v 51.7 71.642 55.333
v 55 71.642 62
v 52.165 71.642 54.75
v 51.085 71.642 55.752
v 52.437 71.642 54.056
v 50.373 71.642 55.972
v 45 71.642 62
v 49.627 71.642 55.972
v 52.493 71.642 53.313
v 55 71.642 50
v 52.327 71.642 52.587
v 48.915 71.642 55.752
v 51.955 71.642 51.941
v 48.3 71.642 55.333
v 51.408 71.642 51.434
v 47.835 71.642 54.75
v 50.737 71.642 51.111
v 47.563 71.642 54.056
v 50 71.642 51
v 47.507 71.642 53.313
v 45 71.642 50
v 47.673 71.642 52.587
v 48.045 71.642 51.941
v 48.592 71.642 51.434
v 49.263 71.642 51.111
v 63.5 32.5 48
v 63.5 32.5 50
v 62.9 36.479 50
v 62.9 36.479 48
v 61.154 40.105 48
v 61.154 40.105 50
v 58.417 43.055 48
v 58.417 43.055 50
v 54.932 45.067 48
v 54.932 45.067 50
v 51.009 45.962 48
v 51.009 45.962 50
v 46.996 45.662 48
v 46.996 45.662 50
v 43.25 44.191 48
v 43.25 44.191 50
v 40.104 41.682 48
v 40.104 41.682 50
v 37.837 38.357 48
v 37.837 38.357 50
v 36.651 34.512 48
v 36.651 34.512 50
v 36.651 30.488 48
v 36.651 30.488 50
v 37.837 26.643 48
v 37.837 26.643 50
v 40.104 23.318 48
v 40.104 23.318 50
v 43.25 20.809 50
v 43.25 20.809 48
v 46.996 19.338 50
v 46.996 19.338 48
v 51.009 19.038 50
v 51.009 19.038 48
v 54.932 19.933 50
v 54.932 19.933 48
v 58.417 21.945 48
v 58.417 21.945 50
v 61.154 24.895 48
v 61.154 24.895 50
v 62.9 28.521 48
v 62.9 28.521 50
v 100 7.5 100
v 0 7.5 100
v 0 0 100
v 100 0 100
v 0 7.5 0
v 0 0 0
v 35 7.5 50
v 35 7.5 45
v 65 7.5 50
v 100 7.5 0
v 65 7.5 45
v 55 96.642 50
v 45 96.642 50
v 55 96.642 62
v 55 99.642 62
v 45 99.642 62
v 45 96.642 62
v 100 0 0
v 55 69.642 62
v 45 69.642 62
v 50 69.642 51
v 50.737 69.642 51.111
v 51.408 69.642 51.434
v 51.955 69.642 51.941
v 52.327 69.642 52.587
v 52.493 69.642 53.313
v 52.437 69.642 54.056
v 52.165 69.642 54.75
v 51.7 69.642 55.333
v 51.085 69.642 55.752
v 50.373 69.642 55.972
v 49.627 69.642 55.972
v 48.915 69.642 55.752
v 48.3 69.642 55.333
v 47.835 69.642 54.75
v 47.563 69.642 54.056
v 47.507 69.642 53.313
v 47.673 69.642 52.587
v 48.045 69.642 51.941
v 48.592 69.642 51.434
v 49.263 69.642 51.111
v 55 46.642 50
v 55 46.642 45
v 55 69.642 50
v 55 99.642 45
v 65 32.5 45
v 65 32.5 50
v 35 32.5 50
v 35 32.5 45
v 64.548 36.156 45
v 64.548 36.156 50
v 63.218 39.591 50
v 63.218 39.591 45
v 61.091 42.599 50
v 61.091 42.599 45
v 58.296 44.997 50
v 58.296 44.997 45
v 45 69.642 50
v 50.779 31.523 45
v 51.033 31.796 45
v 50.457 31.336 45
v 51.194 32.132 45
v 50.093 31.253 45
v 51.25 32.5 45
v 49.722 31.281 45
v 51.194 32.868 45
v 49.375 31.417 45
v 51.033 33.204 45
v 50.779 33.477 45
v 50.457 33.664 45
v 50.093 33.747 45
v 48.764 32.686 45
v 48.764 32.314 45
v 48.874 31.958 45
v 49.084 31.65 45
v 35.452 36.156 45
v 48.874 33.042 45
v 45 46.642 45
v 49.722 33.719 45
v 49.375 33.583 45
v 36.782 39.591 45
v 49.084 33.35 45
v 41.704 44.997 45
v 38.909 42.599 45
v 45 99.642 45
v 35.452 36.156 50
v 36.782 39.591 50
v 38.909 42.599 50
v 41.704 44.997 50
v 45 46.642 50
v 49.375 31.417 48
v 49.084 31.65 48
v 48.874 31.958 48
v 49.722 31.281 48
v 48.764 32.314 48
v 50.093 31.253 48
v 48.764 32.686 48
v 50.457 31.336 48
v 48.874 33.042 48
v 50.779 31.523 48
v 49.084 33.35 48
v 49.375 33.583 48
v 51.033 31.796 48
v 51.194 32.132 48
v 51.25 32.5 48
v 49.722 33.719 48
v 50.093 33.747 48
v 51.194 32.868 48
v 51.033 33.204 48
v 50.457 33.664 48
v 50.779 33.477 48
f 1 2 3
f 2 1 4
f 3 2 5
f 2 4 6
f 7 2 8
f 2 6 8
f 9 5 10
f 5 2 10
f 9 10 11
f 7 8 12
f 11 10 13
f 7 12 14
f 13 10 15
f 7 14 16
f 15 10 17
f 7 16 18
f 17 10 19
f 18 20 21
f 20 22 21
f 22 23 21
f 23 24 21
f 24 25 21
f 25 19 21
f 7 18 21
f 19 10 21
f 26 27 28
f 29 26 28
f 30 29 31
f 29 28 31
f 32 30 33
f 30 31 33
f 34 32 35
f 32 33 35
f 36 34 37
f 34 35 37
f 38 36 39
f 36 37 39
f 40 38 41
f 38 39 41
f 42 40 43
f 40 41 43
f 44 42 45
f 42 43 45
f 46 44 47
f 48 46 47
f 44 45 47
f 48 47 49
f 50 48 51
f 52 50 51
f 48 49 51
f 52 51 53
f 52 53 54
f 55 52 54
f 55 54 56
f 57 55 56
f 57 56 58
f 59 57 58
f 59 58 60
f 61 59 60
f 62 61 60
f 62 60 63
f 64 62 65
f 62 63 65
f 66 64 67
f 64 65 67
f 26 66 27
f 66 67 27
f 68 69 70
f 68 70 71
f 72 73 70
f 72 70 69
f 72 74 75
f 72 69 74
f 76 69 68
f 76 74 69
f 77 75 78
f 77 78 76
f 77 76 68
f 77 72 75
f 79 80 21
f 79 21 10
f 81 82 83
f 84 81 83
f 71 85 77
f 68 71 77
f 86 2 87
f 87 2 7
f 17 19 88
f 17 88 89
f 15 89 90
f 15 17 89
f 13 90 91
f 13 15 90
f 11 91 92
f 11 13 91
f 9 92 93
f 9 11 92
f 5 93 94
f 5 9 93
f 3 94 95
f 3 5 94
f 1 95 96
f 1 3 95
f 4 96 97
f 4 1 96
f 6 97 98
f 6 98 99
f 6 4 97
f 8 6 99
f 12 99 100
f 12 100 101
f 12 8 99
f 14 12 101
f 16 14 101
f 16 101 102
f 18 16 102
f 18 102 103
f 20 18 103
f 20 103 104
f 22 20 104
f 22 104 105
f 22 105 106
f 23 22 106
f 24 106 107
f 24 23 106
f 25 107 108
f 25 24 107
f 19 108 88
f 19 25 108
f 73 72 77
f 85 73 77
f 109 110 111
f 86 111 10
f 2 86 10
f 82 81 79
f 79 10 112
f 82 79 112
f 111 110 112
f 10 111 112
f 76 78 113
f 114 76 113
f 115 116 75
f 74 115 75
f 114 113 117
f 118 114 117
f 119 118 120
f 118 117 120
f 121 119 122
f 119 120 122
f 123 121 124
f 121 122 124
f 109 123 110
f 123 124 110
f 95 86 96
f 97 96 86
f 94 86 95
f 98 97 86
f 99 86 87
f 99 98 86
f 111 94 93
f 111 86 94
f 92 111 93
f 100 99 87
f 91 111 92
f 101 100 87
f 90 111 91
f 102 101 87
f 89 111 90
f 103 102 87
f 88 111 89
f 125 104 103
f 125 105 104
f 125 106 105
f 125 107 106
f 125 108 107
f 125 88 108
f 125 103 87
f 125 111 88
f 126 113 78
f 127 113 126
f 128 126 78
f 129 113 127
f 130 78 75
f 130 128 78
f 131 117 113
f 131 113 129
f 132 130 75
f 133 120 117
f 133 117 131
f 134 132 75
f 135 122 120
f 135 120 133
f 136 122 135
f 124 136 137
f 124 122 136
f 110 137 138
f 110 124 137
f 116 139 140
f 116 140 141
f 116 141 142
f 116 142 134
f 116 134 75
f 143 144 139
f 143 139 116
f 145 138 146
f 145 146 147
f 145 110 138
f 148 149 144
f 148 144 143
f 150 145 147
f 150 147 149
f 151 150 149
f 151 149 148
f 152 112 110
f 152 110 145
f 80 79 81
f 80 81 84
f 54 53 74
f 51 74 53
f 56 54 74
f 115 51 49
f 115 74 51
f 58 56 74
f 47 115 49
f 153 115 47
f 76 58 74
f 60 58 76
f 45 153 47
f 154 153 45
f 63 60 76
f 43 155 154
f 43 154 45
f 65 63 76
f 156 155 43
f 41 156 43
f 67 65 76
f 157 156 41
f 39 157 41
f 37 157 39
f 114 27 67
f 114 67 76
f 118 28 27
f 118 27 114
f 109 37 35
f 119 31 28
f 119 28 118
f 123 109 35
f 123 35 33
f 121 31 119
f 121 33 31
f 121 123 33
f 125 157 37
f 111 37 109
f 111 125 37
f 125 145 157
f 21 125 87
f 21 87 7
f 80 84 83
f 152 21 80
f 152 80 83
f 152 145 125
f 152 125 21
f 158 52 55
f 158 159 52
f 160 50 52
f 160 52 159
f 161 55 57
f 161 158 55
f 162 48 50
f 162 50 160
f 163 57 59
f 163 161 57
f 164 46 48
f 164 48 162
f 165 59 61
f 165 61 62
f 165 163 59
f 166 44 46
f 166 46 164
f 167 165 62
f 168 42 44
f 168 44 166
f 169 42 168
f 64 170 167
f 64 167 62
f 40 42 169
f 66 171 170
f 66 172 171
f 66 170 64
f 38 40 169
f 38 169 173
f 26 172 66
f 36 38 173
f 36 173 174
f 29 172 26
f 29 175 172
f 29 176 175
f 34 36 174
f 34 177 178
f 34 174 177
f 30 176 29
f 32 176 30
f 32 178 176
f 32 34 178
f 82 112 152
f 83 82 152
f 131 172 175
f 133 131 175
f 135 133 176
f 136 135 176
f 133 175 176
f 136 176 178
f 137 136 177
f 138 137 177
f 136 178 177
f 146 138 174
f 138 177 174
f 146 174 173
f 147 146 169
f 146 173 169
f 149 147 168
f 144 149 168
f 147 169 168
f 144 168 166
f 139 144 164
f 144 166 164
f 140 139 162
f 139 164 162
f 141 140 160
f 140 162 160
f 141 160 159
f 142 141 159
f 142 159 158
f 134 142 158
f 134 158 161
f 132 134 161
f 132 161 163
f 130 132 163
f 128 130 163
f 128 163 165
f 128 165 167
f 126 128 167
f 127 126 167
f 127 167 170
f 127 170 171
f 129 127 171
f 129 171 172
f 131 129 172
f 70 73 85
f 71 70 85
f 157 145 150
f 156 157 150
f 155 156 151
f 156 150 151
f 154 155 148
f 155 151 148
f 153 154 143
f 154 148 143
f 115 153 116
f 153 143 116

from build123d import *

# Parameters (mm, degrees)
SKETCH1_W           = 100
SKETCH1_H           = 7.5
BOSS_EXTRUDE1_DEPTH = 100
BOSS_EXTRUDE2_START = 45
BOSS_EXTRUDE2_DEPTH = 5
SKETCH3_R           = 13.5
CUT_EXTRUDE1_DEPTH  = 2
SKETCH4_W           = 10
SKETCH4_H           = 3
BOSS_EXTRUDE3_DEPTH = 17
SKETCH6_W           = 10
SKETCH6_H           = 12
SKETCH6_R           = 2.5
BOSS_EXTRUDE4_DEPTH = 2
CUT_EXTRUDE2_REACH  = 152.441
SKETCH7_R           = 1.25


with BuildPart() as part:
    # Sketch1 → Boss-Extrude1 (new body)
    with BuildSketch(Plane.XY):
        with Locations((50, 3.75)):
            Rectangle(SKETCH1_W, SKETCH1_H)
    extrude(amount=BOSS_EXTRUDE1_DEPTH)

    # Sketch2 → Boss-Extrude2 (add)
    with BuildSketch(Plane.XY.offset(BOSS_EXTRUDE2_START)):
        with BuildLine():
            Line((35, 7.5), (65, 7.5))
            Line((65, 7.5), (65, 32.5))
            ThreePointArc((65, 32.5), (62.247448714, 41.160254038), (55, 46.642135624))
            Line((55, 46.642135624), (55, 96.642135624))
            Line((55, 96.642135624), (45, 96.642135624))
            Line((45, 96.642135624), (45, 46.642135624))
            ThreePointArc((45, 46.642135624), (37.752551286, 41.160254038), (35, 32.5))
            Line((35, 32.5), (35, 7.5))
        make_face()
    extrude(amount=BOSS_EXTRUDE2_DEPTH)

    # Sketch3 → Cut-Extrude1 (cut)
    with BuildSketch(Plane.XY.offset(50)):
        with Locations((50, 32.5)):
            Circle(SKETCH3_R)
    extrude(amount=-CUT_EXTRUDE1_DEPTH, mode=Mode.SUBTRACT)

    # Sketch4 → Boss-Extrude3 (add)
    with BuildSketch(Plane(origin=(0, 0, 45), x_dir=(-1, 0, 0), z_dir=(0, 0, -1))):
        with Locations((-50, 98.142135624)):
            Rectangle(SKETCH4_W, SKETCH4_H)
    extrude(amount=-BOSS_EXTRUDE3_DEPTH)

    # Sketch6 → Boss-Extrude4 (add)
    with BuildSketch(Plane(origin=(0, 71.642135624, 0), x_dir=(-1, 0, 0), z_dir=(0, -1, 0))):
        with Locations((-50, -56)):
            Rectangle(SKETCH6_W, SKETCH6_H)
        with Locations(Location((-50, -53.5, 0), (0, 0, 90))):
            Circle(SKETCH6_R, mode=Mode.SUBTRACT)
    extrude(amount=BOSS_EXTRUDE4_DEPTH)

    # Sketch7 → Cut-Extrude2 (cut, up to next)
    with BuildSketch(Plane.XY.offset(48), mode=Mode.PRIVATE) as cut_extrude2_sk1:
        with Locations((50, 32.5)):
            Circle(SKETCH7_R)
    cut_extrude2_tool1 = extrude(cut_extrude2_sk1.sketch, amount=-CUT_EXTRUDE2_REACH, mode=Mode.PRIVATE) & part.part
    add(cut_extrude2_tool1.solids().sort_by_distance((50, 32.5, 48))[0], mode=Mode.SUBTRACT)


solid = part.part
